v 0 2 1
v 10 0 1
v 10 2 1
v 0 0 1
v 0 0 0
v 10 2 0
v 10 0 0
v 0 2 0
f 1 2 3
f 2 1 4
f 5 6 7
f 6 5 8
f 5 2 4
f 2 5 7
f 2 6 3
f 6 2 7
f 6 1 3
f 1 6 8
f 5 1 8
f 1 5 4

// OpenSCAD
width = 10;
height = 2;
enabled = false;

cube([width, height, enabled ? 3 : 1]);
